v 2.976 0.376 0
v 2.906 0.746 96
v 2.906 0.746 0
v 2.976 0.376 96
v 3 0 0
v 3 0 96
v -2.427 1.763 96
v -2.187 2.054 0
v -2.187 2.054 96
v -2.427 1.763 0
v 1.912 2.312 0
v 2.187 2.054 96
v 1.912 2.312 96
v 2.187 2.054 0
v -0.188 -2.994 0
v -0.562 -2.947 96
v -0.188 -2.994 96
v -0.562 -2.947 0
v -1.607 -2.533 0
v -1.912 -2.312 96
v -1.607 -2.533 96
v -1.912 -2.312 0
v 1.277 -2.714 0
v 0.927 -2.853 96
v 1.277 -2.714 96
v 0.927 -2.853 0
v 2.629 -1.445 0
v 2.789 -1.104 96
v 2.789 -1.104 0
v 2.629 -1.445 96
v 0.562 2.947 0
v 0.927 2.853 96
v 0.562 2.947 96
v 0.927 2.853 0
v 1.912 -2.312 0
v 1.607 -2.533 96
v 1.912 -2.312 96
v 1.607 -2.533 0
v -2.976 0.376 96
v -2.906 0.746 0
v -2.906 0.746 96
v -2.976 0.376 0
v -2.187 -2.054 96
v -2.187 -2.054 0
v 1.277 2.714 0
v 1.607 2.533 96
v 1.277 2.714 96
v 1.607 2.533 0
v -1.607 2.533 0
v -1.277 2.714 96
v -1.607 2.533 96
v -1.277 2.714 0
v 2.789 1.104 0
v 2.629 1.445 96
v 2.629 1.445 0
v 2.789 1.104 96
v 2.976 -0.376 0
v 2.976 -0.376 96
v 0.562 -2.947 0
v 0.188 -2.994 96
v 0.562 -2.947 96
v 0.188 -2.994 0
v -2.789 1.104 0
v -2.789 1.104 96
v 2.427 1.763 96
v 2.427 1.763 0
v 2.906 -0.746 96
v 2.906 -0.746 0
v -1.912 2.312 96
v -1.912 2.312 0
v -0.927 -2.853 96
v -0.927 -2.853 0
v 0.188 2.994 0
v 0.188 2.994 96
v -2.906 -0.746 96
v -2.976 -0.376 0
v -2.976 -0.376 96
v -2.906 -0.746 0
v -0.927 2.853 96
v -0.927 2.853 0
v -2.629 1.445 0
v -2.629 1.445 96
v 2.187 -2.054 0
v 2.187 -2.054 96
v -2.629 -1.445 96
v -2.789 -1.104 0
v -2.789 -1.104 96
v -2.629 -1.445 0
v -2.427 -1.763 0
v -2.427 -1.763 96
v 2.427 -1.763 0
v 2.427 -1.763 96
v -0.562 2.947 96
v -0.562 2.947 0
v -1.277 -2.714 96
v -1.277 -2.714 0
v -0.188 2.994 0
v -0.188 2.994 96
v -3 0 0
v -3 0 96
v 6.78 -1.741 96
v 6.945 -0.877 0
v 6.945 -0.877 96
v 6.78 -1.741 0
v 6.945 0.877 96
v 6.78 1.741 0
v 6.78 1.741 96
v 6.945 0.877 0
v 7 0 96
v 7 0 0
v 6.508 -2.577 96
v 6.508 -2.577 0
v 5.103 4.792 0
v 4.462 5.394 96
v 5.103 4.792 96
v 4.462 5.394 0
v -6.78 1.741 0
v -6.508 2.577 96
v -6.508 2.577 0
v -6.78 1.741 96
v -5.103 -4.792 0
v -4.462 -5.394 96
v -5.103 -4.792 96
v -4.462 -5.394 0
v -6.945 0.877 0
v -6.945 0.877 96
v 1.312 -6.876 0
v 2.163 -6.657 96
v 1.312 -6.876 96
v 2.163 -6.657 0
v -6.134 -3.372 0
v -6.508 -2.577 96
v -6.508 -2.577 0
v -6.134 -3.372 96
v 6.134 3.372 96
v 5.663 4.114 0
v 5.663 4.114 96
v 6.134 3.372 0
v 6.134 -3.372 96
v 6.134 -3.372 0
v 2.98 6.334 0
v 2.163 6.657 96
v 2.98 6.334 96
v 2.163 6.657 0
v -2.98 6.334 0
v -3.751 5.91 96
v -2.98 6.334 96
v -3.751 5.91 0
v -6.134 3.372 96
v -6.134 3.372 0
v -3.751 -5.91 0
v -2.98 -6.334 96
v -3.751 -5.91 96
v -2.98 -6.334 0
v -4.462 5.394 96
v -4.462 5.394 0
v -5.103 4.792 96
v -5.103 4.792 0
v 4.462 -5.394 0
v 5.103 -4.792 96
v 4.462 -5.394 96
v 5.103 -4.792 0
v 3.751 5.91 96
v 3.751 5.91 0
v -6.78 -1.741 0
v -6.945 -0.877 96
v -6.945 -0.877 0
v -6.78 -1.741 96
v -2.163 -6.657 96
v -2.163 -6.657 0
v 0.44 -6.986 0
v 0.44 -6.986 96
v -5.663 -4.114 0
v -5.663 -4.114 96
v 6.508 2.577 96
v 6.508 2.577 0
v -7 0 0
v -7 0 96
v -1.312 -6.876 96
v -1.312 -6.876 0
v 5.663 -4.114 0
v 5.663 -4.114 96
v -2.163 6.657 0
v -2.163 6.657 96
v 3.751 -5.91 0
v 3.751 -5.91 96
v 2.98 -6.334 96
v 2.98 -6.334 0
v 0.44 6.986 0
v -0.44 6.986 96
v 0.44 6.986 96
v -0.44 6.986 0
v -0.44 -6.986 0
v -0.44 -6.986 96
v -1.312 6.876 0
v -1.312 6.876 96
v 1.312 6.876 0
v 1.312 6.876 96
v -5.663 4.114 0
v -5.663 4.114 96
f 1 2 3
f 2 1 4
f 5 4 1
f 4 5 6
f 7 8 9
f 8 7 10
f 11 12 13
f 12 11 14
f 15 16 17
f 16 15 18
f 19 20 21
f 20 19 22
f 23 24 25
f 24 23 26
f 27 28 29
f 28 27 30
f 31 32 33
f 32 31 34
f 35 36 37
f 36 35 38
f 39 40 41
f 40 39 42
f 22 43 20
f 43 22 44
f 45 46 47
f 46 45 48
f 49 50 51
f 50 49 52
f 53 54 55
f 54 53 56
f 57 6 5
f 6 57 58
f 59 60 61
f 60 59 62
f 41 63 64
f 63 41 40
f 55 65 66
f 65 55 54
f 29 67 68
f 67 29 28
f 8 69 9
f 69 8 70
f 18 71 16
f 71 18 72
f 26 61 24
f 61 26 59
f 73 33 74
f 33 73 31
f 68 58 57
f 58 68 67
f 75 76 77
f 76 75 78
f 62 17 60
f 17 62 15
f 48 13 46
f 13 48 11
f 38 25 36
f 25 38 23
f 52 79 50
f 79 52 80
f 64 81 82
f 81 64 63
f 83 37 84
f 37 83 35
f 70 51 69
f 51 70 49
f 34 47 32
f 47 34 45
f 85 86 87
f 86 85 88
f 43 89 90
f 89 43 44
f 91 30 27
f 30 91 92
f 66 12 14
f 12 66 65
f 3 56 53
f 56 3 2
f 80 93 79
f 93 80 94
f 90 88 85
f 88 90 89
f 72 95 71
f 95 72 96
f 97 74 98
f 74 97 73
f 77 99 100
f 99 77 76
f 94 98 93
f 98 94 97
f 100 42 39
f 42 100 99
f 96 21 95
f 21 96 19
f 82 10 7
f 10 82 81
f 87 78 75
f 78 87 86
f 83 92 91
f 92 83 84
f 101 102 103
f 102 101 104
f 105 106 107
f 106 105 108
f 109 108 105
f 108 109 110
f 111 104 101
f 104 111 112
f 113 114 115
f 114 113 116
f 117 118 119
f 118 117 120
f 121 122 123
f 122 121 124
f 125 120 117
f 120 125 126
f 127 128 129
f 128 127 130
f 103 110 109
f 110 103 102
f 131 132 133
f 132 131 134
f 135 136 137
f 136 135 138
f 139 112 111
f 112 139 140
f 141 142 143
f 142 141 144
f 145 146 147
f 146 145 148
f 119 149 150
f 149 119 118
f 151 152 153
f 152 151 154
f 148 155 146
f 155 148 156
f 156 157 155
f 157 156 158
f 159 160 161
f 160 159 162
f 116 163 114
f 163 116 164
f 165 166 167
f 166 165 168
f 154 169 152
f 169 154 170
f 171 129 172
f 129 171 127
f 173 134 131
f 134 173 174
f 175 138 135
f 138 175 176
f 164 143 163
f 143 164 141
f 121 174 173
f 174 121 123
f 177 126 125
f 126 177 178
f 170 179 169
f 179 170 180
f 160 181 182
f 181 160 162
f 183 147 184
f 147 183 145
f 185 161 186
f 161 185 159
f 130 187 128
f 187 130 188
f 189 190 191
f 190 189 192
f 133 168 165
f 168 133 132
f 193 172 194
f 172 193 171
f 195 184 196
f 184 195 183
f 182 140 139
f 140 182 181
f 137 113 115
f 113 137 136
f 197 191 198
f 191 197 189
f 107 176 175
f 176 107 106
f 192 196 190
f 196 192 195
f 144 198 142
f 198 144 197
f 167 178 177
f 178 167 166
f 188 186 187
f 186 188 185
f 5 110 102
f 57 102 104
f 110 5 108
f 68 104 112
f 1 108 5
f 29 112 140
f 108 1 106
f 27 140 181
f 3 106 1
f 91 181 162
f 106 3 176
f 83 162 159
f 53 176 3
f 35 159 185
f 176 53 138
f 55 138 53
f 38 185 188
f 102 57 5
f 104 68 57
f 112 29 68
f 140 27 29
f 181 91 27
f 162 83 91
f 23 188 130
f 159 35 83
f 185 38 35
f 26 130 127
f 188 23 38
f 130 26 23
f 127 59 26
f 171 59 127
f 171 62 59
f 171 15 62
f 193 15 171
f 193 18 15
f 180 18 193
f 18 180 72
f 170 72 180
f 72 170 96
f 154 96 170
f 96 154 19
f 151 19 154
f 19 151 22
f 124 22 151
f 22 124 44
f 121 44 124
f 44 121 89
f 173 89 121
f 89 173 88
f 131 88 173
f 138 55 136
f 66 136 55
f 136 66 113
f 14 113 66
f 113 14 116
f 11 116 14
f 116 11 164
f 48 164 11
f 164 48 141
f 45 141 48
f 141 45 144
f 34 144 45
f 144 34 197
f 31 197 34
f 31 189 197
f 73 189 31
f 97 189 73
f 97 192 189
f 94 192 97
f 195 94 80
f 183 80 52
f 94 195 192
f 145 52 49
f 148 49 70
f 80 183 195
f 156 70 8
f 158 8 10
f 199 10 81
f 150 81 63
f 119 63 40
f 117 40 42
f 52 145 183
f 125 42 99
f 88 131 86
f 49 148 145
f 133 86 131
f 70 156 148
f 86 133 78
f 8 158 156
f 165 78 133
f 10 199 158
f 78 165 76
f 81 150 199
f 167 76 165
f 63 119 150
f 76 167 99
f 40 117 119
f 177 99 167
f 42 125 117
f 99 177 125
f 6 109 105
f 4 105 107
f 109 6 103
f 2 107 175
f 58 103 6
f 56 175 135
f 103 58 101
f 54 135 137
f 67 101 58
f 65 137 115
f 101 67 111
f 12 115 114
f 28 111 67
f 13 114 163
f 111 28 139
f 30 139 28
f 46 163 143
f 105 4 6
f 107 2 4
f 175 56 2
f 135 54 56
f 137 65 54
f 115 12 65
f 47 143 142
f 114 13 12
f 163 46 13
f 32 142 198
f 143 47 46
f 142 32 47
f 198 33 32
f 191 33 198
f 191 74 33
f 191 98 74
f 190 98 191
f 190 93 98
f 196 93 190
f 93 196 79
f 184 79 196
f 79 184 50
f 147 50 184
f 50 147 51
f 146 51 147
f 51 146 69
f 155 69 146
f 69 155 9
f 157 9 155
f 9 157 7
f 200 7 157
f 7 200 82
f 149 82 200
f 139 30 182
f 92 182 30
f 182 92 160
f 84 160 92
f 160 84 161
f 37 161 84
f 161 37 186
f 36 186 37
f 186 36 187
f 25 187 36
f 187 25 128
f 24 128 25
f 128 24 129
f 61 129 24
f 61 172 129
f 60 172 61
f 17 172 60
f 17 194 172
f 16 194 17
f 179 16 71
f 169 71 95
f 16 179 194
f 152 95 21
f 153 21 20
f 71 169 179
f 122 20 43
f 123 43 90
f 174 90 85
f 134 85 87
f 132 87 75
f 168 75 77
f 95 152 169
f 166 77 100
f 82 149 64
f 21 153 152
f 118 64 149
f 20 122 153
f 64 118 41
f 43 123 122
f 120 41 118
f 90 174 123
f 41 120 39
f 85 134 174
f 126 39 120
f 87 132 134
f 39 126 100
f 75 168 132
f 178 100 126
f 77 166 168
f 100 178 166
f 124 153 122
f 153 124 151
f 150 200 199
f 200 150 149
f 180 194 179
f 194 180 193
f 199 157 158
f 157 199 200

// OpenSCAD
$fn = 50;


difference() {
	union() {
		cylinder(h = 96, r = 7.0000000000);
	}
	union() {
		translate(v = [0.0000000000, 0.0000000000, -100.0000000000]) {
			cylinder(h = 200, r = 3.0000000000);
		}
		translate(v = [0.0000000000, 0.0000000000, -100.0000000000]) {
			cylinder(h = 200, r = 3.0000000000);
		}
		translate(v = [0.0000000000, 0.0000000000, -100.0000000000]) {
			cylinder(h = 200, r = 3.0000000000);
		}
		translate(v = [0.0000000000, 0.0000000000, -100.0000000000]) {
			cylinder(h = 200, r = 3.0000000000);
		}
	}
}
